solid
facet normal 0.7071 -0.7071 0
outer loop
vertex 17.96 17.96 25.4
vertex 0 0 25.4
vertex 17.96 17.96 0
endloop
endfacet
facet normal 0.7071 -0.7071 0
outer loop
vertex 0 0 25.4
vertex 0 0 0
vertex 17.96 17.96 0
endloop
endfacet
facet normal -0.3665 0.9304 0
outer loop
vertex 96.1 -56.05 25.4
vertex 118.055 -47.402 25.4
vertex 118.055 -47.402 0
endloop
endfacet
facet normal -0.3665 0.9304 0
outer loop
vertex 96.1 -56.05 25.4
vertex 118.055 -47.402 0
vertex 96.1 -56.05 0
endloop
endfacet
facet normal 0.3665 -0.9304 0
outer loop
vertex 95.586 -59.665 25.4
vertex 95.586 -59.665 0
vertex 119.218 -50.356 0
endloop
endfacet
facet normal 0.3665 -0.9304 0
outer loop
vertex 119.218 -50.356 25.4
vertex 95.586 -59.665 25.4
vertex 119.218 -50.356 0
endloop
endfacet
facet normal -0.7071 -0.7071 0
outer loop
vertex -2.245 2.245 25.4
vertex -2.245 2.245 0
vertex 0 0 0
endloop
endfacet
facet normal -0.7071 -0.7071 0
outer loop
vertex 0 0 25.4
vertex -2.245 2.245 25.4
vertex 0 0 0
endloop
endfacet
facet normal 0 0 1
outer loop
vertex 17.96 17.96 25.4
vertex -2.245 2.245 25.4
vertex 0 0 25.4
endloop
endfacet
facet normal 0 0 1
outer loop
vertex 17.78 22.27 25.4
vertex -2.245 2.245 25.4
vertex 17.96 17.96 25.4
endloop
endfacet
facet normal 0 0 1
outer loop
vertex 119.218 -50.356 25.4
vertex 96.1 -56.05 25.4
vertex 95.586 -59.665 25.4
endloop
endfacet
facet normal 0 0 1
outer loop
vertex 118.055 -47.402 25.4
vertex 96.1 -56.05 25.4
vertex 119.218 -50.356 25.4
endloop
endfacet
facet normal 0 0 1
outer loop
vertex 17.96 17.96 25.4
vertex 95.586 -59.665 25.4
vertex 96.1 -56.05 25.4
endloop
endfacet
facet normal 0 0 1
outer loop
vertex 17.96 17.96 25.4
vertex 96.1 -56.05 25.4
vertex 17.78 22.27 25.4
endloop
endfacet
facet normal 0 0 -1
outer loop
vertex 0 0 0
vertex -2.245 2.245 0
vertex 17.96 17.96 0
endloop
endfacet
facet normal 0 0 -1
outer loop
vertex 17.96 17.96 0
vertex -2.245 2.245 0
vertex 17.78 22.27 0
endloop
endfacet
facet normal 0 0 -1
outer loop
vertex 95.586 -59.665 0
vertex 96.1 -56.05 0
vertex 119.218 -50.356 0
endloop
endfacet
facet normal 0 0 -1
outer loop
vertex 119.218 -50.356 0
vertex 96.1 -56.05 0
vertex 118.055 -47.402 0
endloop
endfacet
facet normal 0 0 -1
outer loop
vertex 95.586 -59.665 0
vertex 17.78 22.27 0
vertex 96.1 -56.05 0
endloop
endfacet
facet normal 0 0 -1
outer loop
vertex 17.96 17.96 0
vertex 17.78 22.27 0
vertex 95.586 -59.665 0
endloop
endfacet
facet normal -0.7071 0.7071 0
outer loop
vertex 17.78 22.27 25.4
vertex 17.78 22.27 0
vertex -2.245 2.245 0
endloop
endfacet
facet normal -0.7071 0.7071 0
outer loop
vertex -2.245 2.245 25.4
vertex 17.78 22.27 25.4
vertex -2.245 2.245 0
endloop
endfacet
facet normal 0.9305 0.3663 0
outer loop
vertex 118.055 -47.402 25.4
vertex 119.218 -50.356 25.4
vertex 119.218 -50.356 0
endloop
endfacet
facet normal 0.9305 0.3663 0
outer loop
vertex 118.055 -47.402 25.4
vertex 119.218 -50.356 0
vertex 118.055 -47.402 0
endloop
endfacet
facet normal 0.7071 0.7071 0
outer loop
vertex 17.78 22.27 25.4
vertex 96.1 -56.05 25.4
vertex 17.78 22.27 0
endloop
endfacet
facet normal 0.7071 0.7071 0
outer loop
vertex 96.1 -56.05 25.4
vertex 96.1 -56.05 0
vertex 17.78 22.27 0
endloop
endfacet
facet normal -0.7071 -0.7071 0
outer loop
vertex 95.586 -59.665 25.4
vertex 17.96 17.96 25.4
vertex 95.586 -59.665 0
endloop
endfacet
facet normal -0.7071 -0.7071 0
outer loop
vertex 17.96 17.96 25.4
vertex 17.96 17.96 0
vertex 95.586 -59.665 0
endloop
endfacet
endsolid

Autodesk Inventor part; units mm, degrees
ref_plane "YZ Plane" through (0, 0, 0) normal (1, 0, 0) x (0, 1, 0)
ref_plane "XZ Plane" through (0, 0, 0) normal (0, 1, 0) x (-1, 0, 0)
ref_plane "XY Plane" through (0, 0, 0) normal (0, 0, 1) x (1, 0, 0)
sketch "Sketch1" plane through (0, 0, 0) normal (0, 0, 1) x (1, 0, 0)
  line L0 (0, 0) -> (17.9605, 17.9605)
  line L1 (0, 0) -> (25.4, 0) construction
  line L2 (17.7799, 22.2704) -> (-2.2453, 2.2453)
  line L3 (-2.2453, 2.2453) -> (0, 0)
  line L4 (17.9605, 17.9605) -> (95.5858, -59.6648)
  line L5 (17.9605, 17.9605) -> (127.7393, 17.9605) construction
  line L6 (95.5858, -59.6648) -> (119.2185, -50.3557)
  line L7 (95.5858, -59.6648) -> (120.9858, -59.6648) construction
  line L8 (119.2185, -50.3557) -> (118.0548, -47.4016)
  line L9 (118.0548, -47.4016) -> (96.1001, -56.0498)
  line L10 (96.1001, -56.0498) -> (17.7799, 22.2704)
  dimension "d14" = 25.4
  dimension "d15" = 45
  dimension "d24" = 109.7788
  dimension "d25" = 45
  dimension "d26" = 25.4
  dimension "d27" = 21.5
  dimension "d28" = 3.175
  dimension "d29" = 23.5966
extrude "Extrusion2" add sketch "Sketch1" along normal blind 25.4
properties part number "LoadSlideBracket"
